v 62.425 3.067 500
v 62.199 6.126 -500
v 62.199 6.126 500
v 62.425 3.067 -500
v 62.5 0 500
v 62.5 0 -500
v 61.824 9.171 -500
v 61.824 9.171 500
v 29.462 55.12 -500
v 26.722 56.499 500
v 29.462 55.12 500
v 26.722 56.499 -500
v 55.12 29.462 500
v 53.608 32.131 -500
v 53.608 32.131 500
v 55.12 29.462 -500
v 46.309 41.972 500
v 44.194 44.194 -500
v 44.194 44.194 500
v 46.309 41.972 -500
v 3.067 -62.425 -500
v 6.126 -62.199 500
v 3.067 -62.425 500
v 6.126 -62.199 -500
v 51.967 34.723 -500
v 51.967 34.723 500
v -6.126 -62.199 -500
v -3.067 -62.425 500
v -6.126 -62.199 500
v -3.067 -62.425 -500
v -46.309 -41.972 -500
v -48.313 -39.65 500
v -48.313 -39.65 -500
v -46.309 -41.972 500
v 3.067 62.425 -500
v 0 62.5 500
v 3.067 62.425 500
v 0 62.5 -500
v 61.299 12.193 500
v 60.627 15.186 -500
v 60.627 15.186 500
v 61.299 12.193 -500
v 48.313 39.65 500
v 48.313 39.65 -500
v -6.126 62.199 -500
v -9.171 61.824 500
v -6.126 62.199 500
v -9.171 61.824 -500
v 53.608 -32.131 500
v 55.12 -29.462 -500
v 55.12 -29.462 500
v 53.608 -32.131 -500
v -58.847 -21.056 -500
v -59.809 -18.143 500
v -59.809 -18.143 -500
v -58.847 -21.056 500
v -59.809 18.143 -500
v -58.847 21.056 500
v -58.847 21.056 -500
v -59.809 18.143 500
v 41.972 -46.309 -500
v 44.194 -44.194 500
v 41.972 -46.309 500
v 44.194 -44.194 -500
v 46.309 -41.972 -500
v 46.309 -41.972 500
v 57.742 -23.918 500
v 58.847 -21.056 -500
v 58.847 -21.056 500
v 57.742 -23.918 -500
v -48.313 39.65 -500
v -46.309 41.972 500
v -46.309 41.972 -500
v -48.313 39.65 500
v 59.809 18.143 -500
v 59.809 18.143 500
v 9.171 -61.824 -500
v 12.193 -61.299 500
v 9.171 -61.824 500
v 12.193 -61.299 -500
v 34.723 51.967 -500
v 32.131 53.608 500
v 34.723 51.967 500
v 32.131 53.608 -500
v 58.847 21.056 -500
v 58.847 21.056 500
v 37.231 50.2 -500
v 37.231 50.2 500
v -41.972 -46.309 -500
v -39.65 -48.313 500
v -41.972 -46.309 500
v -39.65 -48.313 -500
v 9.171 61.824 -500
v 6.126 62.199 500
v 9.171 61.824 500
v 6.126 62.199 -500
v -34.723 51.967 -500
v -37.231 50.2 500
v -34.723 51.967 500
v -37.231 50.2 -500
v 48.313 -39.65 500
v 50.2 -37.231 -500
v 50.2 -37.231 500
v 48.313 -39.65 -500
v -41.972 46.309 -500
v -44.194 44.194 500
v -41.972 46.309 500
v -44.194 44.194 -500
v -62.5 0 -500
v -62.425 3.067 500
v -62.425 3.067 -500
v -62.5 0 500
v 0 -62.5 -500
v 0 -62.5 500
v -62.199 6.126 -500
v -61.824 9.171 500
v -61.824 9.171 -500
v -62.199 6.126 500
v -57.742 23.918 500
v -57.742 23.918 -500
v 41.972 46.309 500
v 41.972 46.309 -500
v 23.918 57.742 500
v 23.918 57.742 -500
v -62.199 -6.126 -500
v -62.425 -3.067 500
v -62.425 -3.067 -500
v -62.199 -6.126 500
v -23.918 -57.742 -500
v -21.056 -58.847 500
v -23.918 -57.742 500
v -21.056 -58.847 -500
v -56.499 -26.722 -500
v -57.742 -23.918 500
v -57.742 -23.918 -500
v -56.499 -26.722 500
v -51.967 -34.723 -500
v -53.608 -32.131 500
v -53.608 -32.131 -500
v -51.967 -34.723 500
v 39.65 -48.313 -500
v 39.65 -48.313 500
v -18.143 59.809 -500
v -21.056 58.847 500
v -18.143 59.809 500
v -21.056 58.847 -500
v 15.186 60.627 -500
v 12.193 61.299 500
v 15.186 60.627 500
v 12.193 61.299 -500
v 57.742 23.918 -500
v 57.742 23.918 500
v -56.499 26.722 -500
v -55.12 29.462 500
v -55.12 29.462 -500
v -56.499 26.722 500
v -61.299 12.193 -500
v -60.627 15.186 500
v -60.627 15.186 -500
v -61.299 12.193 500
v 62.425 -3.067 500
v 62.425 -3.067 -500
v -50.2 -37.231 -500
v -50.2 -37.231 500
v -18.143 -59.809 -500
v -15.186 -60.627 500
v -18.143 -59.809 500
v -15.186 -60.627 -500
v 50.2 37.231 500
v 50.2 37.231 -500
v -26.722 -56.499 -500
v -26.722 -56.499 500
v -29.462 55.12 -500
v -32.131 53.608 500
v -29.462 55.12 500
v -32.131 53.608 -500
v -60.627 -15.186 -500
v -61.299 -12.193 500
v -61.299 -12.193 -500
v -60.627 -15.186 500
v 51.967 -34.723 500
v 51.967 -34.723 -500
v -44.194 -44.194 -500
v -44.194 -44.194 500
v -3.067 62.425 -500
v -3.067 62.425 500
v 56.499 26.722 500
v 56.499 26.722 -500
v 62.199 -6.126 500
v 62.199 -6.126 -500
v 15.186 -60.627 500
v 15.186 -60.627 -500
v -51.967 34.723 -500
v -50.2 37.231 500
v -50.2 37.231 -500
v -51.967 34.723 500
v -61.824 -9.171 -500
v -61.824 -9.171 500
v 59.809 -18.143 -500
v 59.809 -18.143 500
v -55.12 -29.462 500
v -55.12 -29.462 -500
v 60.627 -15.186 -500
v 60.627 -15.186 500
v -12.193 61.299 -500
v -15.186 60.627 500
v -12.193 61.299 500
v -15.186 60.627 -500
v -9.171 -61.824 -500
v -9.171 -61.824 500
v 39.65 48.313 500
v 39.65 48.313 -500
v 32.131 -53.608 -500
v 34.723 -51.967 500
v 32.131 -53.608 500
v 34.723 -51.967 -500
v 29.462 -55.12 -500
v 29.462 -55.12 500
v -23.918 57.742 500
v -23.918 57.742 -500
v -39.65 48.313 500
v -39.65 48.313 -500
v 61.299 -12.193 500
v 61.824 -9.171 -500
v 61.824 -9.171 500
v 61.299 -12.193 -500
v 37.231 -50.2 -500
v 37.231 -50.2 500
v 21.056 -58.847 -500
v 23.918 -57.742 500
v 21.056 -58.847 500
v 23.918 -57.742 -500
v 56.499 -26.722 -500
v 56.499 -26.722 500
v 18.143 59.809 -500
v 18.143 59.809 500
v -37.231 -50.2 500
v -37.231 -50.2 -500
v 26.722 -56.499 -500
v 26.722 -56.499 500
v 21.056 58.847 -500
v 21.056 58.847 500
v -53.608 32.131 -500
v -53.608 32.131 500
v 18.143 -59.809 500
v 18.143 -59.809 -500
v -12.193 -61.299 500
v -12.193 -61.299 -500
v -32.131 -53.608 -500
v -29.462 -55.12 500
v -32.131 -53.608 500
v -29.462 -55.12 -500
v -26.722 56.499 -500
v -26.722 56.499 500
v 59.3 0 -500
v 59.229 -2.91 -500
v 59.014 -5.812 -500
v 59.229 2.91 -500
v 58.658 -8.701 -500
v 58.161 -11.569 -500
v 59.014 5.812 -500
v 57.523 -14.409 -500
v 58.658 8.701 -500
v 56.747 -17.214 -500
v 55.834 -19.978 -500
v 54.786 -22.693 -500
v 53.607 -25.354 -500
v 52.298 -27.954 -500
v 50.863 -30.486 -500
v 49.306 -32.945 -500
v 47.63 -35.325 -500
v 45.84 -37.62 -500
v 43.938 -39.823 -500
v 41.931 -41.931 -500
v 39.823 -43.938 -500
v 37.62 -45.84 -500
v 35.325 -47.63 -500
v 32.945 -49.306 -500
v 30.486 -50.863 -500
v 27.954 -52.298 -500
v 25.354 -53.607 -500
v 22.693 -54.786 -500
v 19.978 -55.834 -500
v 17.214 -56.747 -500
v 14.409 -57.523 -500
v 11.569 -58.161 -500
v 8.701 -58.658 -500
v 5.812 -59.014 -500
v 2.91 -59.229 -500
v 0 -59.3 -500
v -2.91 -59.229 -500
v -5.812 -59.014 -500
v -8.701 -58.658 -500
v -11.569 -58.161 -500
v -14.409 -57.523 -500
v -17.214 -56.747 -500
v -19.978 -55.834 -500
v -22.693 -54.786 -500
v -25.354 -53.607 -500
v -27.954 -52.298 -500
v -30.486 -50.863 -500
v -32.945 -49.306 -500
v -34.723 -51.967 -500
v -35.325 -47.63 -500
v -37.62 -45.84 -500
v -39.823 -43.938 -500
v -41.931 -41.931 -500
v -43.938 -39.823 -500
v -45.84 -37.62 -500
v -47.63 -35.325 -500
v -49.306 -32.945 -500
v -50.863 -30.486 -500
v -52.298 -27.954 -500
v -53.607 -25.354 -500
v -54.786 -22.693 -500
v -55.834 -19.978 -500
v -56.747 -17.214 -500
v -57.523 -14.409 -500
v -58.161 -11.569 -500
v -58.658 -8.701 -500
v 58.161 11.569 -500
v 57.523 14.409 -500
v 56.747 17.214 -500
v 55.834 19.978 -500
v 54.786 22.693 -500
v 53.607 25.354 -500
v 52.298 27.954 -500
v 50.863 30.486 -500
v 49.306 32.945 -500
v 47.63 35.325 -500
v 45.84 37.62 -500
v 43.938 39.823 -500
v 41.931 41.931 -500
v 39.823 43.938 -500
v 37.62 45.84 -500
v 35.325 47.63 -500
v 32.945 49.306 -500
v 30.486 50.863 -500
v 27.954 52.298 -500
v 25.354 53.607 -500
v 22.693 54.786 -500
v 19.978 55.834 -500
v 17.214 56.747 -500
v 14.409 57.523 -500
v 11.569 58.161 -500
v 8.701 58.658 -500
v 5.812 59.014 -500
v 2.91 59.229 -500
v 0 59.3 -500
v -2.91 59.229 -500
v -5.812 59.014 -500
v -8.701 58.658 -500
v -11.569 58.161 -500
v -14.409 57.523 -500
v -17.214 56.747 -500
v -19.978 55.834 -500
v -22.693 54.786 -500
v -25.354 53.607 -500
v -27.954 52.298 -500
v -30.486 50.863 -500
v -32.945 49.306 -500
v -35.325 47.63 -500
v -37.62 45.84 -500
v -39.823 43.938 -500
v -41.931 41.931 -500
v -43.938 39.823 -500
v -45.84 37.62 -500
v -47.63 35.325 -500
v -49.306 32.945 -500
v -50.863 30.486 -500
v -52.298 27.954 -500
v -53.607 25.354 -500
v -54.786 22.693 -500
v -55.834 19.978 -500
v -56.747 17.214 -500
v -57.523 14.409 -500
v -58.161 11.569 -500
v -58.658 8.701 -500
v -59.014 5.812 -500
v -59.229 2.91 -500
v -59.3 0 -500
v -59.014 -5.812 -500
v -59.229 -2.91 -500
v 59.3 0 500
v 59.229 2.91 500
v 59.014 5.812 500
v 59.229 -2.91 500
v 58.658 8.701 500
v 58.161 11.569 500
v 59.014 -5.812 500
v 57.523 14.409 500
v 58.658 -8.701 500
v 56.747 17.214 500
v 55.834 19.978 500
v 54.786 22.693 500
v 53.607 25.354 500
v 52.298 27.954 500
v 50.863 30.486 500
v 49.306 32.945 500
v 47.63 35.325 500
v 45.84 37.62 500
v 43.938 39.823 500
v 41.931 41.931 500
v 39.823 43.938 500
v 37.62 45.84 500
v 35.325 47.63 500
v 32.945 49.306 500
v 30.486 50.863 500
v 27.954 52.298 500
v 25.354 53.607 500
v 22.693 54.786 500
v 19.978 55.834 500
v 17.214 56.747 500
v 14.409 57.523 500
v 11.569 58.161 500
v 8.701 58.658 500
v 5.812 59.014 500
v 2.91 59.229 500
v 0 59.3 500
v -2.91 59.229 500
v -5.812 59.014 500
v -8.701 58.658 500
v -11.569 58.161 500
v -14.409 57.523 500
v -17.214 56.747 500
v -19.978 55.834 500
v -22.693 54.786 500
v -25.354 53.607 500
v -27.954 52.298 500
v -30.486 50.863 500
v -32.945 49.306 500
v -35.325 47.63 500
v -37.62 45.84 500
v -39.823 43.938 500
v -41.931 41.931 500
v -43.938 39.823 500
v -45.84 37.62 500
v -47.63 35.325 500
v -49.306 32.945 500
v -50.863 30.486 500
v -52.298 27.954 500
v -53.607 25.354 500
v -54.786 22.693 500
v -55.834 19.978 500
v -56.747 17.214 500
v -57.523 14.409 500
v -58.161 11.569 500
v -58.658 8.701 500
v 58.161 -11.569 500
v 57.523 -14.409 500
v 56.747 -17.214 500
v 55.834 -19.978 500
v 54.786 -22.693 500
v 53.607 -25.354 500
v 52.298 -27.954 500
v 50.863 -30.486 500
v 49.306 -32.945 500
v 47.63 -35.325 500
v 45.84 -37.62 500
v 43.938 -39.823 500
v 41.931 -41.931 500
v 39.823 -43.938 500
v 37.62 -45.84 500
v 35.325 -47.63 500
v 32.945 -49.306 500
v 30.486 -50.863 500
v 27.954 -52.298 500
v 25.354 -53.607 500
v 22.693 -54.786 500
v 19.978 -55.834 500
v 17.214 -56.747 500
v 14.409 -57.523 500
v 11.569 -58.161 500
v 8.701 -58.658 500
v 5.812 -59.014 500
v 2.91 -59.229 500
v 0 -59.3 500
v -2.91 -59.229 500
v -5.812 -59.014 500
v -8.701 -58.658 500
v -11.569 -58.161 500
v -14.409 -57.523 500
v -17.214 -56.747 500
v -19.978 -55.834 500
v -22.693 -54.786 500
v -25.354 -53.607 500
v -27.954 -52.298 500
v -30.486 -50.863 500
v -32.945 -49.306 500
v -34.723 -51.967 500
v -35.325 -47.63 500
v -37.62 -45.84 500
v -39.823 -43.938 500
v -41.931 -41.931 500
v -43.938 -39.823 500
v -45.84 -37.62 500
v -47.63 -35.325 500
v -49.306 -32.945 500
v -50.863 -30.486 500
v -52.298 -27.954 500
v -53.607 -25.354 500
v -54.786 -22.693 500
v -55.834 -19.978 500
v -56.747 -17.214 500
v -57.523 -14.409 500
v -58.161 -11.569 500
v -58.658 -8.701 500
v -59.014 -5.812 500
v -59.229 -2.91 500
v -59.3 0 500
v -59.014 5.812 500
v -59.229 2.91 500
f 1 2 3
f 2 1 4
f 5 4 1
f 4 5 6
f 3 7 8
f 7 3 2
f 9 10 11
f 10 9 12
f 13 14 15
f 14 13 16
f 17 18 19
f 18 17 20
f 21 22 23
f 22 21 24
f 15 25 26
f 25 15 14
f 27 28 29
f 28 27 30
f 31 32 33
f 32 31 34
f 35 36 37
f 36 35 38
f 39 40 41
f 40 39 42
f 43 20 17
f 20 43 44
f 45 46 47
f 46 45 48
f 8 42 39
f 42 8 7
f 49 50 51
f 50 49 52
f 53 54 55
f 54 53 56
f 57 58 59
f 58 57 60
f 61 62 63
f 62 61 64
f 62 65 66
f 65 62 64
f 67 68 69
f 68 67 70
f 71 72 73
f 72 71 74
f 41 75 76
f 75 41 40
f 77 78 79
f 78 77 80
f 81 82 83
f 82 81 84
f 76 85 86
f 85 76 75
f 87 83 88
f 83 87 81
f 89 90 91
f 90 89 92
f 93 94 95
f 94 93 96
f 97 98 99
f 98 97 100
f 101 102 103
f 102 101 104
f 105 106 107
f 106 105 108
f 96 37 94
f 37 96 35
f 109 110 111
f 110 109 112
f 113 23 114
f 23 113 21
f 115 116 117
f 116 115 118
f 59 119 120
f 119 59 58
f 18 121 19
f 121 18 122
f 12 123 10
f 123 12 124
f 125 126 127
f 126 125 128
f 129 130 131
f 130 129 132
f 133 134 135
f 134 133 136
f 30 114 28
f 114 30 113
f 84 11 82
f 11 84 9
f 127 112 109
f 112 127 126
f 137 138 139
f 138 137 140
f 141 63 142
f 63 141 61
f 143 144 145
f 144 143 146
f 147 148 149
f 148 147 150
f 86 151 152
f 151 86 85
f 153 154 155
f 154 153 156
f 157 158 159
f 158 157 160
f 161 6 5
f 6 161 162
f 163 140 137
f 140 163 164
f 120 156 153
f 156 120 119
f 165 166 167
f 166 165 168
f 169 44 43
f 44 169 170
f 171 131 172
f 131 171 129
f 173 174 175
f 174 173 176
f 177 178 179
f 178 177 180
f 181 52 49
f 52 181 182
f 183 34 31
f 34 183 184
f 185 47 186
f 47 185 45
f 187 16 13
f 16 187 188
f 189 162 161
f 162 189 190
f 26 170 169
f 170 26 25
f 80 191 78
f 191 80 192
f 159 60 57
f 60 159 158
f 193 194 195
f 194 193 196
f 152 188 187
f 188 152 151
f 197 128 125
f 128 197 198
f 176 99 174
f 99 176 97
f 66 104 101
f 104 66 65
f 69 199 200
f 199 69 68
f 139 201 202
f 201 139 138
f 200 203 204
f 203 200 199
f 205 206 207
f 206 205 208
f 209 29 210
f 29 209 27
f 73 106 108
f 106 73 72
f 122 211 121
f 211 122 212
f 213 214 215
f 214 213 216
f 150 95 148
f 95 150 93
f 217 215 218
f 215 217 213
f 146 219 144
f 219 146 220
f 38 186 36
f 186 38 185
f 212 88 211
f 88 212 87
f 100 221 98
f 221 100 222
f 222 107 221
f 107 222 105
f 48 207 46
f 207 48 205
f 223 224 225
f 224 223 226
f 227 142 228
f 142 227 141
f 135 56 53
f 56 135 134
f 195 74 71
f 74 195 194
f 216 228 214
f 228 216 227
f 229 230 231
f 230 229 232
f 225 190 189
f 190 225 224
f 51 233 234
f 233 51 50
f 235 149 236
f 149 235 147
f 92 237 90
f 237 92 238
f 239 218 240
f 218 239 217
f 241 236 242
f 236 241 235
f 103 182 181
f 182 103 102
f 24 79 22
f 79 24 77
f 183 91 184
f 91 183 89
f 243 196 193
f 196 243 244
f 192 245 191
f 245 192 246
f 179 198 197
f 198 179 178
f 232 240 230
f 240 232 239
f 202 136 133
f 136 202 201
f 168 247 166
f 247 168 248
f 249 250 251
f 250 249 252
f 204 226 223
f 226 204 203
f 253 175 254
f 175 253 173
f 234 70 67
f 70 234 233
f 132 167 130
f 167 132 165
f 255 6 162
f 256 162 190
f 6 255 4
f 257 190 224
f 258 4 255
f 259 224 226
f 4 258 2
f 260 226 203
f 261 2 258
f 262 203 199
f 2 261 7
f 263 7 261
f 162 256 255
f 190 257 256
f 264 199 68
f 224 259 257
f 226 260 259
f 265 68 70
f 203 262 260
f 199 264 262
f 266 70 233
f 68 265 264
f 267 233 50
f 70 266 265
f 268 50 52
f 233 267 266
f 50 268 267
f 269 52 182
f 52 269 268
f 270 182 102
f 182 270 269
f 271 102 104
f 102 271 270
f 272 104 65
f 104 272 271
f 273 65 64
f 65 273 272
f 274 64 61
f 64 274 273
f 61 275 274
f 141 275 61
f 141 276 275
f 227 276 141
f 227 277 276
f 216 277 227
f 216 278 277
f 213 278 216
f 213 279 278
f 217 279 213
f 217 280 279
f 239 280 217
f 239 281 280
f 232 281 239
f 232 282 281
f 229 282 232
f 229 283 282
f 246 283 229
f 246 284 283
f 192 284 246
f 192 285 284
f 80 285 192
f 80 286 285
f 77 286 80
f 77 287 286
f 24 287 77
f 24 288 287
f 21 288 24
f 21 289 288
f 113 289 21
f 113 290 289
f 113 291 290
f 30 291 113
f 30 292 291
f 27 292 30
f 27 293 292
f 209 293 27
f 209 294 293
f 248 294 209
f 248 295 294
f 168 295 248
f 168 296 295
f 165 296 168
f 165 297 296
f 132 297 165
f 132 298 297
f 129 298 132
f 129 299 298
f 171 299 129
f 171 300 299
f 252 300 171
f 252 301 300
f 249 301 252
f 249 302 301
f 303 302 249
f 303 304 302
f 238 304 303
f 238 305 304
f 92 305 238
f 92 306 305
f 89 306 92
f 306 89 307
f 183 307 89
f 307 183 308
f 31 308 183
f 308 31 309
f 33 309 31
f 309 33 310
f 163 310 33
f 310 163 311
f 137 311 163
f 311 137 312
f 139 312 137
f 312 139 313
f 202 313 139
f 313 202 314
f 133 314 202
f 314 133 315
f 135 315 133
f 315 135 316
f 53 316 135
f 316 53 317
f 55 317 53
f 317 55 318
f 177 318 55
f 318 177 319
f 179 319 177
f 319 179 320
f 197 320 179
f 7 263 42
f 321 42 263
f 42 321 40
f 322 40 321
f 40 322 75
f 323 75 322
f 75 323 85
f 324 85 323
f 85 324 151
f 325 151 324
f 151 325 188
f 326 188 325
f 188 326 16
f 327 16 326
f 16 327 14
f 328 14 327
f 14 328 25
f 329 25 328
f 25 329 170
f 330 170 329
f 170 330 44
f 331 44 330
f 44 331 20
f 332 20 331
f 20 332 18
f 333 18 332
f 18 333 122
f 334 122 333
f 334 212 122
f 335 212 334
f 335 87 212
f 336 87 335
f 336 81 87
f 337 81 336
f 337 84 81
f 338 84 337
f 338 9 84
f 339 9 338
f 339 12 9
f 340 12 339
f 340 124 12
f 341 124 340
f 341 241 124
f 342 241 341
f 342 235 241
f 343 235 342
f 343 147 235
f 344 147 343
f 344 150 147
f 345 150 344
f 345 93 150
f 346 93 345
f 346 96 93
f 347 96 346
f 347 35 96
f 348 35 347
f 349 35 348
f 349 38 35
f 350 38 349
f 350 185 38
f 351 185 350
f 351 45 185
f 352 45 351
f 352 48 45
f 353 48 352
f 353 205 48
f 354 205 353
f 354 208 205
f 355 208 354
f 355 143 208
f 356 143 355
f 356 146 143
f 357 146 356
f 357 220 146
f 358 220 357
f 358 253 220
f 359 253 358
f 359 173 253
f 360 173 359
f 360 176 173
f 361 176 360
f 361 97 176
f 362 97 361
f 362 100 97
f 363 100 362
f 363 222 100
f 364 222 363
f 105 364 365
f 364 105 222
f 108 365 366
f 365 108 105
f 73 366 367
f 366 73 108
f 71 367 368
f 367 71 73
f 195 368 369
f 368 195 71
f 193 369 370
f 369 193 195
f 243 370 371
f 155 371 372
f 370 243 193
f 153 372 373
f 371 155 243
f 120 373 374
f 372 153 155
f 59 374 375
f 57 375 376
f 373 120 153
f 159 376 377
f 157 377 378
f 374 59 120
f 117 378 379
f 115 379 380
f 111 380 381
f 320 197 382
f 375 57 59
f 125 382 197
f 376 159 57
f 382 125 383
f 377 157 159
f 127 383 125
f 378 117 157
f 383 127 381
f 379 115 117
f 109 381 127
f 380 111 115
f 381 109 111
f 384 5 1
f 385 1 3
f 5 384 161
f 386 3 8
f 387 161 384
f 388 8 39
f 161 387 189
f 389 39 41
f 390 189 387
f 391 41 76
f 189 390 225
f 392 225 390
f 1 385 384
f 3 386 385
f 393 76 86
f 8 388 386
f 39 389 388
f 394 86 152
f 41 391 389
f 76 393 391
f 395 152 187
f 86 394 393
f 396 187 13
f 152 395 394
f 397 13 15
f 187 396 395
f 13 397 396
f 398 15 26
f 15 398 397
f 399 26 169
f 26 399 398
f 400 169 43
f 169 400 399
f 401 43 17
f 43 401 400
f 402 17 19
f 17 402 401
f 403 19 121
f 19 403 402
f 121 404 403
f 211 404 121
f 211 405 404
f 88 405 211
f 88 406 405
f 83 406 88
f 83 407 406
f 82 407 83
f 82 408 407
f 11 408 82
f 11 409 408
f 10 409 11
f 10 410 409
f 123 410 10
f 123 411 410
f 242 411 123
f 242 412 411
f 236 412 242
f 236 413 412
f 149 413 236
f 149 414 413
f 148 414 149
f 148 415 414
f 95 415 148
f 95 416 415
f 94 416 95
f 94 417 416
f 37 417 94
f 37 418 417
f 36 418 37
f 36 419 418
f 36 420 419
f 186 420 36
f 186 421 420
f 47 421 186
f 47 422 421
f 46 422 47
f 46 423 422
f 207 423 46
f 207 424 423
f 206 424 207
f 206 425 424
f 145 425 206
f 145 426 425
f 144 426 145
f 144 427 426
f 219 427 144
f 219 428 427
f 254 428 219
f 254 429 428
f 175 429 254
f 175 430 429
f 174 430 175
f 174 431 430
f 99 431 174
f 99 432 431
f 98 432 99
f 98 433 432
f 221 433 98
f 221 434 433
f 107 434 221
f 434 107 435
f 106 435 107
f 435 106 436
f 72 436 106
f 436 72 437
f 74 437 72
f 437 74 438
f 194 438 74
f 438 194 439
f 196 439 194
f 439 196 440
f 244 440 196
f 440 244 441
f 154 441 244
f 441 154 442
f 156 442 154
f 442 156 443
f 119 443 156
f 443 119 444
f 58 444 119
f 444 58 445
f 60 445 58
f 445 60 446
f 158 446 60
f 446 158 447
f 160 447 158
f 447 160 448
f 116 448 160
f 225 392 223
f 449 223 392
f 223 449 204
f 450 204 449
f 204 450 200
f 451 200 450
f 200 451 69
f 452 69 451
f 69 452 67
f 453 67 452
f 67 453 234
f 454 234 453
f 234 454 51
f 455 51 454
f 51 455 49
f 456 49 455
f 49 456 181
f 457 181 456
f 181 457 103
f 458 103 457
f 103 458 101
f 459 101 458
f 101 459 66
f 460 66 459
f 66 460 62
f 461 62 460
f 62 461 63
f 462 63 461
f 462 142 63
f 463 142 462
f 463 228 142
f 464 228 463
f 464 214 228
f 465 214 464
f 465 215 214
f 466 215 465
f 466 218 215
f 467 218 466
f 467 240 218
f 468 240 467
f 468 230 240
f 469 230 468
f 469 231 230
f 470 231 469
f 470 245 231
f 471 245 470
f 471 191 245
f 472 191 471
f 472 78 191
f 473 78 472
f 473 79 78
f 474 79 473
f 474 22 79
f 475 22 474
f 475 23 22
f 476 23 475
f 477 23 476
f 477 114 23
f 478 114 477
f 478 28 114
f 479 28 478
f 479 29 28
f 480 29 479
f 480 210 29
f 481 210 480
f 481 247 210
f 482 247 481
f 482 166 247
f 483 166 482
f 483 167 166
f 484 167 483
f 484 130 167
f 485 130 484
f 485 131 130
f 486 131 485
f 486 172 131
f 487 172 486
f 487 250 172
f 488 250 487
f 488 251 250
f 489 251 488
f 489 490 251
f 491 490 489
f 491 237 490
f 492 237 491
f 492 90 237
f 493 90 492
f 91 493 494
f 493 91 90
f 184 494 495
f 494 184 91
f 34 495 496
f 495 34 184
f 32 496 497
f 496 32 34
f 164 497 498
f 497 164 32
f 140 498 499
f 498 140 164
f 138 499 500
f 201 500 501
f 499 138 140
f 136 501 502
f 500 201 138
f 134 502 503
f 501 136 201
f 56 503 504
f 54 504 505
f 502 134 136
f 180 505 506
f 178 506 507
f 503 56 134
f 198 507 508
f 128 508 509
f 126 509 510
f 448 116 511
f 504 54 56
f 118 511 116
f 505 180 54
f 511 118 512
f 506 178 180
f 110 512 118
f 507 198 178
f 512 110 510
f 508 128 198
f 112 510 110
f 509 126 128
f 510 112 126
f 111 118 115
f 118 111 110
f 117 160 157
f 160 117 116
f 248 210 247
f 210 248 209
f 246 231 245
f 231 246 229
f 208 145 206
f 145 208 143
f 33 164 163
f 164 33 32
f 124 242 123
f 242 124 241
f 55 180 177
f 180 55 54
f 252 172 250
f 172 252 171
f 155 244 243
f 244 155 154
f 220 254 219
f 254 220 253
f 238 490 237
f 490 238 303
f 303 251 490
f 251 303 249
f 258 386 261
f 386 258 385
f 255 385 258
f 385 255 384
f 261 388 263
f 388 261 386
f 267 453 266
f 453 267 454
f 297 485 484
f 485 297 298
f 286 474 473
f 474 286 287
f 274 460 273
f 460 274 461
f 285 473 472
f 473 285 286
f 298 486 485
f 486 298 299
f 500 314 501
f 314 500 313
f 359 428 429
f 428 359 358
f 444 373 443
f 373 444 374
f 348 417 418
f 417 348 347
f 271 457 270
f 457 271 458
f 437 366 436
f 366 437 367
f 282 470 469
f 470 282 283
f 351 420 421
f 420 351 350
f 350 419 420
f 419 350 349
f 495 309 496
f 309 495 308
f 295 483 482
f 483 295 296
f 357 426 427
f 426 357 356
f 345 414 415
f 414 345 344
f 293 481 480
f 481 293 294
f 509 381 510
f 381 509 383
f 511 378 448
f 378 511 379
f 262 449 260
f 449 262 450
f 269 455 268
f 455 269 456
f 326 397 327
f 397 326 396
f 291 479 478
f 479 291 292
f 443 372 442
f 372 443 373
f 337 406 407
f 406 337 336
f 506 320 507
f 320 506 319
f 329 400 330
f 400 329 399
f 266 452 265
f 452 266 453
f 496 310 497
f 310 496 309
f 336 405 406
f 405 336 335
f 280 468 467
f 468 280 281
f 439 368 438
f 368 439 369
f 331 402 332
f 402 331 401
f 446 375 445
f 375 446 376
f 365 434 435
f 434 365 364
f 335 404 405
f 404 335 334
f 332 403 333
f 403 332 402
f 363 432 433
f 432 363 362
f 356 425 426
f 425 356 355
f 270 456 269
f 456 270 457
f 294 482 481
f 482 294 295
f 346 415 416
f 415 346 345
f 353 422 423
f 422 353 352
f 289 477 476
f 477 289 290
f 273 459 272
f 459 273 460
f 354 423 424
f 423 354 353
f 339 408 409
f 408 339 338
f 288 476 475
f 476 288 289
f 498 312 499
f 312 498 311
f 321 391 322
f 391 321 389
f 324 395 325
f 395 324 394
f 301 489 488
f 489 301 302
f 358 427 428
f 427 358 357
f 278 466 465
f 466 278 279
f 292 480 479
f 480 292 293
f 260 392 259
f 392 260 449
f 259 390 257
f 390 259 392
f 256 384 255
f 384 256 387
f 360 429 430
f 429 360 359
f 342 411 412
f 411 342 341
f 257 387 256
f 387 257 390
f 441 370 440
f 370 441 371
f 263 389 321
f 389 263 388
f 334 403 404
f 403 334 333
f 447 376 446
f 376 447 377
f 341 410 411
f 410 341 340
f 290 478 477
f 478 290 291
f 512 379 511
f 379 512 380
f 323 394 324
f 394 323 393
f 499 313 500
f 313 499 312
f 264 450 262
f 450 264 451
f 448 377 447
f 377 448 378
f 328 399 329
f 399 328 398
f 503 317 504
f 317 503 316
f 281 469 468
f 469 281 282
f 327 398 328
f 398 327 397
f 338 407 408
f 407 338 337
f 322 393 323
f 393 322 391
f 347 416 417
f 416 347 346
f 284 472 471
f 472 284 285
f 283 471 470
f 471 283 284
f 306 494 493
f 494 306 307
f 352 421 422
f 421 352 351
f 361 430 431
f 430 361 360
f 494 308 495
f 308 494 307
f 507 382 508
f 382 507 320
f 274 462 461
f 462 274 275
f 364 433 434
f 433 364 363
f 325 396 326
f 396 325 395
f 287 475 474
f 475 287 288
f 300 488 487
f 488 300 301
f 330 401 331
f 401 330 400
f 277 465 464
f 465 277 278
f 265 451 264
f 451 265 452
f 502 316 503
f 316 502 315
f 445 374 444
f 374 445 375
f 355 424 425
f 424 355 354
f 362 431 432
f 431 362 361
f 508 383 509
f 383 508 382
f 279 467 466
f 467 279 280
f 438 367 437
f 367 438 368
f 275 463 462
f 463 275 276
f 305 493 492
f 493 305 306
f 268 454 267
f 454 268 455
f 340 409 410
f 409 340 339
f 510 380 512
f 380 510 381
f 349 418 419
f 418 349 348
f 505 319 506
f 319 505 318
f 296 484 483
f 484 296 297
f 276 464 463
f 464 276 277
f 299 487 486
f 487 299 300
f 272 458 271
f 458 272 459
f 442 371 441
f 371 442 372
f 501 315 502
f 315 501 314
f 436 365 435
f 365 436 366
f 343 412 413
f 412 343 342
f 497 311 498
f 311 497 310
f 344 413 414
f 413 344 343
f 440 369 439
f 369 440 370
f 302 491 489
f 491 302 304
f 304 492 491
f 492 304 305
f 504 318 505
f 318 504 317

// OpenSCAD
$fn=128;

module ht_pipe(od=125, length=1000, wall=3.2) {
    id = od - 2*wall;
    difference() {
        cylinder(h=length, d=od, center=true);
        cylinder(h=length+2, d=id, center=true);
    }
}

ht_pipe(od=125, length=1000, wall=3.2);
